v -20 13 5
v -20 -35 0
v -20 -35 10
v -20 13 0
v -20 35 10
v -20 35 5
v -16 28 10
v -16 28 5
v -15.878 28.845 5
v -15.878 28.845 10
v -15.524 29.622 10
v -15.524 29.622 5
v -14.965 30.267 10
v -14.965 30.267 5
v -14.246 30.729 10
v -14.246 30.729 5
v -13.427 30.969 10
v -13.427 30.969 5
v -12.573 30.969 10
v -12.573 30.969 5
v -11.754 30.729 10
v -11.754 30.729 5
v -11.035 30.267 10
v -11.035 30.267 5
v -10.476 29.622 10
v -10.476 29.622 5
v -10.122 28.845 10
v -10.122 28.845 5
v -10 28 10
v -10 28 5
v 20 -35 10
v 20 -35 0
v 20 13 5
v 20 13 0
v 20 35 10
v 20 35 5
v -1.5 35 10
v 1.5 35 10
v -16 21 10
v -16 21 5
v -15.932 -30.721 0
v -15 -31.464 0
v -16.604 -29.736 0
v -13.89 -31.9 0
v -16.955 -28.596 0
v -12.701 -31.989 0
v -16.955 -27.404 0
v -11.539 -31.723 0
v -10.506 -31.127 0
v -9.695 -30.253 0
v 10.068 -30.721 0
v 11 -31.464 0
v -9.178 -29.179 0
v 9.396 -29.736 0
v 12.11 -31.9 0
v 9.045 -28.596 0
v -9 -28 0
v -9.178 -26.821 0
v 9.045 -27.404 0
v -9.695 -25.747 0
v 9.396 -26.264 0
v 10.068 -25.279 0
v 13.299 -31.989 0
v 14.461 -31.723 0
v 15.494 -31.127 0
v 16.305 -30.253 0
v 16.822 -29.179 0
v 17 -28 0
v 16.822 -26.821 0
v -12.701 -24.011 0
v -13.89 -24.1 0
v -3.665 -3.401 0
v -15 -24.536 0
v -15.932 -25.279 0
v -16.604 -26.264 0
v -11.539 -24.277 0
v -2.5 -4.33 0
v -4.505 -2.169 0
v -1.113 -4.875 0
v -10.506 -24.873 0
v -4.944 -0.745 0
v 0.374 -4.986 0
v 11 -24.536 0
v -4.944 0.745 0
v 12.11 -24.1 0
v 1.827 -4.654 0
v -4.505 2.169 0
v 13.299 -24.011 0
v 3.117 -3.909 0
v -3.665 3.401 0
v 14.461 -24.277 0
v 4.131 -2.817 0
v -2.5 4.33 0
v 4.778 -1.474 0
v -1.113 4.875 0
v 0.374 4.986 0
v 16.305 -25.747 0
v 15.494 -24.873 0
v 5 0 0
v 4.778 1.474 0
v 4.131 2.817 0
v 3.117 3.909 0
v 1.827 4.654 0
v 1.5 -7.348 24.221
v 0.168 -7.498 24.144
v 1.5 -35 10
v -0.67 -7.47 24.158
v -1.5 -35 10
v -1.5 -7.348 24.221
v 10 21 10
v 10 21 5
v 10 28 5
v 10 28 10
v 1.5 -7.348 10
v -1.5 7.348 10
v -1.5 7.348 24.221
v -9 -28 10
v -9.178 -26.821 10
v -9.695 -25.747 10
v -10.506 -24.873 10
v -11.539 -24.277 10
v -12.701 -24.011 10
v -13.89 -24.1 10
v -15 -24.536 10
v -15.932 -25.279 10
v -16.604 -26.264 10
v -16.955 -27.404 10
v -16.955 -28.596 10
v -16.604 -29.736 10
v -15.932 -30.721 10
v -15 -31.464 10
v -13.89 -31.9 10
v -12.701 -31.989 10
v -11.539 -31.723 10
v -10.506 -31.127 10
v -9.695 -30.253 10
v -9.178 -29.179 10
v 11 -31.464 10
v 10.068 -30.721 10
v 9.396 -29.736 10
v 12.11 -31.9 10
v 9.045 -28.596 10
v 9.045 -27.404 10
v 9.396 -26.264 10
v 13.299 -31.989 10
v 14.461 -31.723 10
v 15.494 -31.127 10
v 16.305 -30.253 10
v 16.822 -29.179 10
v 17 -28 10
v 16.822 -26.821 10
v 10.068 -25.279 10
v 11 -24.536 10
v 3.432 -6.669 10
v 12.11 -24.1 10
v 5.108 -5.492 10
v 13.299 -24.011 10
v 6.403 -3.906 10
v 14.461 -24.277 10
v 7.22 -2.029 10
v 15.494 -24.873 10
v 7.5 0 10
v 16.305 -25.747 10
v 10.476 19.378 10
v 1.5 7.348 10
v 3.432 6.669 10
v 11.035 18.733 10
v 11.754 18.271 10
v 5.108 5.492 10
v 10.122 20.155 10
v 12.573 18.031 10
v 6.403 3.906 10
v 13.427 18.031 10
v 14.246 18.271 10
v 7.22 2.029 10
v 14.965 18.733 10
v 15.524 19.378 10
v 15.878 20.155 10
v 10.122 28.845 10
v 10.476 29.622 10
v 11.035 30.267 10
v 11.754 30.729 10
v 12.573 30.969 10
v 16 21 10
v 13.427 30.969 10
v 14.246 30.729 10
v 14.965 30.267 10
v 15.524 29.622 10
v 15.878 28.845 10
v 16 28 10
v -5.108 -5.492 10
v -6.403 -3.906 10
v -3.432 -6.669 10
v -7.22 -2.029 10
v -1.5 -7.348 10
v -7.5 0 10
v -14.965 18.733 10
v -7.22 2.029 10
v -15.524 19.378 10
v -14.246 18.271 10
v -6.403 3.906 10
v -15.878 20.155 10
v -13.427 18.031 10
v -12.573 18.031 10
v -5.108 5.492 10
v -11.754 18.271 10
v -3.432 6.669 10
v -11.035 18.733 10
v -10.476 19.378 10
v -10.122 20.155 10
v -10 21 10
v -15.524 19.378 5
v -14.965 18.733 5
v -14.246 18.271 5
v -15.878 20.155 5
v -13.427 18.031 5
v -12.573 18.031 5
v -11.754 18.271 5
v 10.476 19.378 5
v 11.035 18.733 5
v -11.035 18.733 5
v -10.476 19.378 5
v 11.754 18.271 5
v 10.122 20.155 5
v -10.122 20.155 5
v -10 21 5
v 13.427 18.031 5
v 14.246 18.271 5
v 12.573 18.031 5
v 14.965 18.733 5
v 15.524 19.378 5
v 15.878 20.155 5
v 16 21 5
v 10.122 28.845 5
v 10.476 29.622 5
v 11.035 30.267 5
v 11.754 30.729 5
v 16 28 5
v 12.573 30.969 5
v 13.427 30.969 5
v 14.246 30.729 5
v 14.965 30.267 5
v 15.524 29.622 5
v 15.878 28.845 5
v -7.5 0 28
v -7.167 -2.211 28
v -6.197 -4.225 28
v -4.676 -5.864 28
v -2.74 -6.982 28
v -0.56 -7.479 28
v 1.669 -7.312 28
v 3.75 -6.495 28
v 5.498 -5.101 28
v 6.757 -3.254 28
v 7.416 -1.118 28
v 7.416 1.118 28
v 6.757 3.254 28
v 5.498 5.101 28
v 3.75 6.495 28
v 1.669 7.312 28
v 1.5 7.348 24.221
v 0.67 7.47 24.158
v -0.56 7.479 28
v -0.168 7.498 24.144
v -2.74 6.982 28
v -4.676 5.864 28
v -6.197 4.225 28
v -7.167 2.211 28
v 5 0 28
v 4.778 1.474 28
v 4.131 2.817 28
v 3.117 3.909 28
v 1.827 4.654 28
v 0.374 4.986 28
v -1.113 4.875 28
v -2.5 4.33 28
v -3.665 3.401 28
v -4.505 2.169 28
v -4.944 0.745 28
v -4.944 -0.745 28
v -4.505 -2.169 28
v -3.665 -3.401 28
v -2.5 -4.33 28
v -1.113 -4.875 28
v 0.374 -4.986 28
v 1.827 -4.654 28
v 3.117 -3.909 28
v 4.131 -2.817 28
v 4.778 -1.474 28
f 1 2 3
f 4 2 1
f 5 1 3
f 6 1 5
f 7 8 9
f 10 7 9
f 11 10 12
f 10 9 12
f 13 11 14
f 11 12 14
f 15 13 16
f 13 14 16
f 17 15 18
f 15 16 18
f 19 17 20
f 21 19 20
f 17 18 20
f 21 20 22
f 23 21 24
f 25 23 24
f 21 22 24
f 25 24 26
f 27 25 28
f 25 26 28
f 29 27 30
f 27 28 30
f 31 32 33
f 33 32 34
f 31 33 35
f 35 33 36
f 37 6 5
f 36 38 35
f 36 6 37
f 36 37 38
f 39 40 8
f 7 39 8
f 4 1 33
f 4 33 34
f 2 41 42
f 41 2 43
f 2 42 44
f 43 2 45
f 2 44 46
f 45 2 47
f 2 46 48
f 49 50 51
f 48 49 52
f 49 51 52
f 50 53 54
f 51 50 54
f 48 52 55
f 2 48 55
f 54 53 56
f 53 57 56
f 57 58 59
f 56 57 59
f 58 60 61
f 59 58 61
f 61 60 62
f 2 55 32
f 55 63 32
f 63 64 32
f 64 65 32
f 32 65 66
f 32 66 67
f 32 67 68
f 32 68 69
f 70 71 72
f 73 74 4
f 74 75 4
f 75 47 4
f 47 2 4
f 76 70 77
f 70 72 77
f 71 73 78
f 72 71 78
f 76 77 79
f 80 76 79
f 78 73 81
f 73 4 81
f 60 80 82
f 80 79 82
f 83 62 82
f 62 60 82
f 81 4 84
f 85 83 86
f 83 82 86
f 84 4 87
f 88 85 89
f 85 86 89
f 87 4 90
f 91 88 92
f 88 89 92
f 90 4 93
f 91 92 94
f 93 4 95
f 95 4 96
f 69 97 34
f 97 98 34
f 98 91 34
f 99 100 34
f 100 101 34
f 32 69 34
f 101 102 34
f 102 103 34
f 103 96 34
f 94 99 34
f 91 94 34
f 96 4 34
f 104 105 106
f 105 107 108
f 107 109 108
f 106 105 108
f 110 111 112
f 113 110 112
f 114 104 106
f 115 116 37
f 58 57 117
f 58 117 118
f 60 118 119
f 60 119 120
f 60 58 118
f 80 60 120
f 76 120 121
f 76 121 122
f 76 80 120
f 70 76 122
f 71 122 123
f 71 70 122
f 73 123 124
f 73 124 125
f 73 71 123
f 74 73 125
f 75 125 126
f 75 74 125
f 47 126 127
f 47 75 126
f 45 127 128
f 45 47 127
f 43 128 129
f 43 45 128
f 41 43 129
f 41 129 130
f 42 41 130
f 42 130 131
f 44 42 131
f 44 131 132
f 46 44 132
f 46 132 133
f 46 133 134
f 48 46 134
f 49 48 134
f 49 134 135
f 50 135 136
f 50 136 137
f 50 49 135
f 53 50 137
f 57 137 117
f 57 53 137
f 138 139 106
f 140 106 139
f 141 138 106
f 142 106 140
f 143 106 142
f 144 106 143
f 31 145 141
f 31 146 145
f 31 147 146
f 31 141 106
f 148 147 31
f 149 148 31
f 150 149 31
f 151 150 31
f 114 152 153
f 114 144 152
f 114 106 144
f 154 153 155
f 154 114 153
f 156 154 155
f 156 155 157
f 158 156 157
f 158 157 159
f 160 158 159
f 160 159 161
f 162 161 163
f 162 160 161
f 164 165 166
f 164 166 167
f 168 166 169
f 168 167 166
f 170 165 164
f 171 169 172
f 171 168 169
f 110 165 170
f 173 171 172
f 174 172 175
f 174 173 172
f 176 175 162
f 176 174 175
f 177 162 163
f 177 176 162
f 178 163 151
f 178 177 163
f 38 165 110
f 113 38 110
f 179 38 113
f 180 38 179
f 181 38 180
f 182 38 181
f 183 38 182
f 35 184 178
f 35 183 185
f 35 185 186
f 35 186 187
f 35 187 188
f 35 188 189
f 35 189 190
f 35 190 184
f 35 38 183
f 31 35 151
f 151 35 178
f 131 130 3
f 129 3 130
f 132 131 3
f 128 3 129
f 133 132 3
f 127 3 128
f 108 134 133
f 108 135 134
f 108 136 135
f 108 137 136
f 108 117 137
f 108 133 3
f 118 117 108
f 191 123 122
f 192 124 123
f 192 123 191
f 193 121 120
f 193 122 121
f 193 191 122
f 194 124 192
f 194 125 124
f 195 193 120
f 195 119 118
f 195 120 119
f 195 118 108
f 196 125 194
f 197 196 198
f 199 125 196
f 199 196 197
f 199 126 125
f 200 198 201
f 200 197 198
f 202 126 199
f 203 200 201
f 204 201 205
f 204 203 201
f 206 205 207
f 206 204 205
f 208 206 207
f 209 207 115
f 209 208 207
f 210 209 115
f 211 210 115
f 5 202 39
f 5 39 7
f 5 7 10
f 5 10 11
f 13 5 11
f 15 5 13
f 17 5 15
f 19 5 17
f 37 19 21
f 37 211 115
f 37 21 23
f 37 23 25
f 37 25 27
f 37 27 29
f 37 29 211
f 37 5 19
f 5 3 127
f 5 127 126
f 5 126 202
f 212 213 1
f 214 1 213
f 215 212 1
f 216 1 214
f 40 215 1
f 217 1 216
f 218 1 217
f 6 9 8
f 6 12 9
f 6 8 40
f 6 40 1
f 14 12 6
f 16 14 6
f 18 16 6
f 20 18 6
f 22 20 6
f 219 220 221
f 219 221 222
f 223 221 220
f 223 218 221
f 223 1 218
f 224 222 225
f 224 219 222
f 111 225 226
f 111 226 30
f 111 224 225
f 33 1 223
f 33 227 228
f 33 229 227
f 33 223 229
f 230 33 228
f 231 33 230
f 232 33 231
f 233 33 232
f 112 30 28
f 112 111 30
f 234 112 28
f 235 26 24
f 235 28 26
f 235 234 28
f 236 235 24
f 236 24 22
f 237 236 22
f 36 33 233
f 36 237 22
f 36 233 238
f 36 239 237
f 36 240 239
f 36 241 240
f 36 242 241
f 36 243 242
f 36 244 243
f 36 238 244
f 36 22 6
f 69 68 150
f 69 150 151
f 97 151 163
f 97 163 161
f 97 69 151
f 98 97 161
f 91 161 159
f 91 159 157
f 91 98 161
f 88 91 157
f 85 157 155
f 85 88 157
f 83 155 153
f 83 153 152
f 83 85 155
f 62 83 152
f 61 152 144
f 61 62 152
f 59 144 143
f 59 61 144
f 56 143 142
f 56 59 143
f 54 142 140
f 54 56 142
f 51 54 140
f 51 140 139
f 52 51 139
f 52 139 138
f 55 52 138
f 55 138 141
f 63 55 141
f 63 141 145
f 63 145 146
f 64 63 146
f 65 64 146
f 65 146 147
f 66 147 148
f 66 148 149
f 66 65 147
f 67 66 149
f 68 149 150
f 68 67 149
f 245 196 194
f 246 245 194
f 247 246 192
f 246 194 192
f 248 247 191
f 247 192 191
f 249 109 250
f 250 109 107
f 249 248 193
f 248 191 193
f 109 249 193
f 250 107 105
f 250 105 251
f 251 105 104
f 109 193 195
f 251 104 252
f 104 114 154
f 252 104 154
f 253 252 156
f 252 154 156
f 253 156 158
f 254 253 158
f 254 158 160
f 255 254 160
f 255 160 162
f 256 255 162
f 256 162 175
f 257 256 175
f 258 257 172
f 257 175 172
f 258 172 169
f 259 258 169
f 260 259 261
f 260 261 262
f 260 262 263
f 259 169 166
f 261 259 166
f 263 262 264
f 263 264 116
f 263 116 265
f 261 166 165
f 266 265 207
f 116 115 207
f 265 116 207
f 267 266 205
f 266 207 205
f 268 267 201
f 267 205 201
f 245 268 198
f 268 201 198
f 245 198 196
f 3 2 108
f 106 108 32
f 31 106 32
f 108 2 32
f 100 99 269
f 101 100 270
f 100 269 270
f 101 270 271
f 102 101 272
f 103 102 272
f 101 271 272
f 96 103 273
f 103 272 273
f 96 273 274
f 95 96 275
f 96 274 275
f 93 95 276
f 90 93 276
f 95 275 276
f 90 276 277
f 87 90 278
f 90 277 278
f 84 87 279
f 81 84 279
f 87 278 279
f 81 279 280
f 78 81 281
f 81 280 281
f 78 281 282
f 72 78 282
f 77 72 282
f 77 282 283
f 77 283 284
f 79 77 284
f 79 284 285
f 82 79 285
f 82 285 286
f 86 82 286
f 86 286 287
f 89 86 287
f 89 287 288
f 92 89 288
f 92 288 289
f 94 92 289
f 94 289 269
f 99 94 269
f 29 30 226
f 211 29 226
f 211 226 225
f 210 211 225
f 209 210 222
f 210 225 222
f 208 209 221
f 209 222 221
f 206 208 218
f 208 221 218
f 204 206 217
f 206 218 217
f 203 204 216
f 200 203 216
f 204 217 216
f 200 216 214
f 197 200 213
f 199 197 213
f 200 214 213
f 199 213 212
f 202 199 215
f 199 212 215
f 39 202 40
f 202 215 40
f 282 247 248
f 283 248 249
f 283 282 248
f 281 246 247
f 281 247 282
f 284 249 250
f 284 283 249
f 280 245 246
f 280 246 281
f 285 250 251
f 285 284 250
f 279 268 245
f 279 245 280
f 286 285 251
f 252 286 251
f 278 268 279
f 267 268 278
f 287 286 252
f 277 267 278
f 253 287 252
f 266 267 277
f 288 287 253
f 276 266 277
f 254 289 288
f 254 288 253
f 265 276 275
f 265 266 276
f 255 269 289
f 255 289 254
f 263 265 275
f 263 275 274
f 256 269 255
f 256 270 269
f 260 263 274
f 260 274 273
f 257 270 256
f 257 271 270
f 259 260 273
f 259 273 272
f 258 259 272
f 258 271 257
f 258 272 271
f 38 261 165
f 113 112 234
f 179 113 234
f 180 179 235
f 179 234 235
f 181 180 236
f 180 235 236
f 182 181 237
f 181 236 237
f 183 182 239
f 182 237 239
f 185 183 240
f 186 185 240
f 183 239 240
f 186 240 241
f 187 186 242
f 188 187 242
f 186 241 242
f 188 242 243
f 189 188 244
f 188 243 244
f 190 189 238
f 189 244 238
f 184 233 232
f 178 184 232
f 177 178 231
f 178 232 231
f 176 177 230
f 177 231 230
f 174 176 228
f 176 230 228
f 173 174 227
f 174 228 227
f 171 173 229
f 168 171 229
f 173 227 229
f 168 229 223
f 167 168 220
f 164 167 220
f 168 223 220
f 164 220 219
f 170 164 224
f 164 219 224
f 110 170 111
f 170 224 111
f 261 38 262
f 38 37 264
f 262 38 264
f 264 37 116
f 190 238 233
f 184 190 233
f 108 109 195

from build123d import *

# Parameters (mm, degrees)
SKETCH_1_W           = 40
SKETCH_1_H           = 70
SKETCH_1_R           = 4
EXTRUDE_1_DEPTH      = 10
SKETCH_2_W           = 5
SKETCH_2_H           = 22
CUT_EXTRUDE_1_DEPTH  = 55.083269132
SKETCH_3_R           = 7.5
EXTRUDE_2_DEPTH      = 18
SKETCH_4_R           = 10
EXTRUDE_3_DEPTH      = 2
EXTRUDE_4_DEPTH      = 1.5
EXTRUDE_4_DEPTH_BACK = 1.5
SKETCH_6_R           = 5
CUT_EXTRUDE_2_DEPTH  = 50.081564767
SKETCH_7_R           = 10
SKETCH_7_R_2         = 7.5
CUT_EXTRUDE_3_DEPTH  = 48.968739821


with BuildPart() as part:
    # Эскиз1 → Бобышка-Вытянуть1 (new body)
    with BuildSketch(Plane.XY):
        Rectangle(SKETCH_1_W, SKETCH_1_H)
        with Locations((13, -28)):
            Circle(SKETCH_1_R, mode=Mode.SUBTRACT)
        with Locations((-13, -28)):
            Circle(SKETCH_1_R, mode=Mode.SUBTRACT)
        with BuildLine():
            Line((10, 21), (10, 28))
            ThreePointArc((10, 28), (13, 31), (16, 28))
            Line((16, 28), (16, 21))
            ThreePointArc((16, 21), (13, 18), (10, 21))
        make_face(mode=Mode.SUBTRACT)
        with BuildLine():
            Line((-16, 21), (-16, 28))
            ThreePointArc((-16, 28), (-13, 31), (-10, 28))
            Line((-10, 28), (-10, 21))
            ThreePointArc((-10, 21), (-13, 18), (-16, 21))
        make_face(mode=Mode.SUBTRACT)
    extrude(amount=EXTRUDE_1_DEPTH)

    # Эскиз2 → Вырез-Вытянуть1 (cut, through all)
    with BuildSketch(Plane(origin=(20, 0, 0), x_dir=(0, 0, -1), z_dir=(1, 0, 0))):
        with Locations((-2.5, 24)):
            Rectangle(SKETCH_2_W, SKETCH_2_H)
    extrude(amount=-CUT_EXTRUDE_1_DEPTH, mode=Mode.SUBTRACT)

    # Эскиз3 → Бобышка-Вытянуть2 (add)
    with BuildSketch(Plane.XY.offset(10)):
        with Locations(Location((0, 0, 0), (0, 0, 180))):
            Circle(SKETCH_3_R)
    extrude(amount=EXTRUDE_2_DEPTH)

    # Эскиз4 → Бобышка-Вытянуть3 (add)
    with BuildSketch(Plane.XY.offset(28)):
        Circle(SKETCH_4_R)
    extrude(amount=-EXTRUDE_3_DEPTH)

    # Эскиз5 → Бобышка-Вытянуть4 (add, two sides: drawn at the far end of the back side and taken through both)
    with BuildSketch(Plane(origin=(0, 0, 0), x_dir=(0, 0, -1), z_dir=(1, 0, 0)).offset(-EXTRUDE_4_DEPTH_BACK)):
        Polygon((-10, 35), (-28, 0), (-10, -35), align=None)
    extrude(amount=EXTRUDE_4_DEPTH + EXTRUDE_4_DEPTH_BACK)

    # Эскиз6 → Вырез-Вытянуть2 (cut, through all)
    with BuildSketch(Plane.XY.offset(28)):
        Circle(SKETCH_6_R)
    extrude(amount=-CUT_EXTRUDE_2_DEPTH, mode=Mode.SUBTRACT)

    # Эскиз7 → Вырез-Вытянуть3 (cut, through all)
    with BuildSketch(Plane(origin=(0, 0, 26), x_dir=(-1, 0, 0), z_dir=(0, 0, -1))):
        Circle(SKETCH_7_R)
        Circle(SKETCH_7_R_2, mode=Mode.SUBTRACT)
    extrude(amount=-CUT_EXTRUDE_3_DEPTH, mode=Mode.SUBTRACT)


solid = part.part
